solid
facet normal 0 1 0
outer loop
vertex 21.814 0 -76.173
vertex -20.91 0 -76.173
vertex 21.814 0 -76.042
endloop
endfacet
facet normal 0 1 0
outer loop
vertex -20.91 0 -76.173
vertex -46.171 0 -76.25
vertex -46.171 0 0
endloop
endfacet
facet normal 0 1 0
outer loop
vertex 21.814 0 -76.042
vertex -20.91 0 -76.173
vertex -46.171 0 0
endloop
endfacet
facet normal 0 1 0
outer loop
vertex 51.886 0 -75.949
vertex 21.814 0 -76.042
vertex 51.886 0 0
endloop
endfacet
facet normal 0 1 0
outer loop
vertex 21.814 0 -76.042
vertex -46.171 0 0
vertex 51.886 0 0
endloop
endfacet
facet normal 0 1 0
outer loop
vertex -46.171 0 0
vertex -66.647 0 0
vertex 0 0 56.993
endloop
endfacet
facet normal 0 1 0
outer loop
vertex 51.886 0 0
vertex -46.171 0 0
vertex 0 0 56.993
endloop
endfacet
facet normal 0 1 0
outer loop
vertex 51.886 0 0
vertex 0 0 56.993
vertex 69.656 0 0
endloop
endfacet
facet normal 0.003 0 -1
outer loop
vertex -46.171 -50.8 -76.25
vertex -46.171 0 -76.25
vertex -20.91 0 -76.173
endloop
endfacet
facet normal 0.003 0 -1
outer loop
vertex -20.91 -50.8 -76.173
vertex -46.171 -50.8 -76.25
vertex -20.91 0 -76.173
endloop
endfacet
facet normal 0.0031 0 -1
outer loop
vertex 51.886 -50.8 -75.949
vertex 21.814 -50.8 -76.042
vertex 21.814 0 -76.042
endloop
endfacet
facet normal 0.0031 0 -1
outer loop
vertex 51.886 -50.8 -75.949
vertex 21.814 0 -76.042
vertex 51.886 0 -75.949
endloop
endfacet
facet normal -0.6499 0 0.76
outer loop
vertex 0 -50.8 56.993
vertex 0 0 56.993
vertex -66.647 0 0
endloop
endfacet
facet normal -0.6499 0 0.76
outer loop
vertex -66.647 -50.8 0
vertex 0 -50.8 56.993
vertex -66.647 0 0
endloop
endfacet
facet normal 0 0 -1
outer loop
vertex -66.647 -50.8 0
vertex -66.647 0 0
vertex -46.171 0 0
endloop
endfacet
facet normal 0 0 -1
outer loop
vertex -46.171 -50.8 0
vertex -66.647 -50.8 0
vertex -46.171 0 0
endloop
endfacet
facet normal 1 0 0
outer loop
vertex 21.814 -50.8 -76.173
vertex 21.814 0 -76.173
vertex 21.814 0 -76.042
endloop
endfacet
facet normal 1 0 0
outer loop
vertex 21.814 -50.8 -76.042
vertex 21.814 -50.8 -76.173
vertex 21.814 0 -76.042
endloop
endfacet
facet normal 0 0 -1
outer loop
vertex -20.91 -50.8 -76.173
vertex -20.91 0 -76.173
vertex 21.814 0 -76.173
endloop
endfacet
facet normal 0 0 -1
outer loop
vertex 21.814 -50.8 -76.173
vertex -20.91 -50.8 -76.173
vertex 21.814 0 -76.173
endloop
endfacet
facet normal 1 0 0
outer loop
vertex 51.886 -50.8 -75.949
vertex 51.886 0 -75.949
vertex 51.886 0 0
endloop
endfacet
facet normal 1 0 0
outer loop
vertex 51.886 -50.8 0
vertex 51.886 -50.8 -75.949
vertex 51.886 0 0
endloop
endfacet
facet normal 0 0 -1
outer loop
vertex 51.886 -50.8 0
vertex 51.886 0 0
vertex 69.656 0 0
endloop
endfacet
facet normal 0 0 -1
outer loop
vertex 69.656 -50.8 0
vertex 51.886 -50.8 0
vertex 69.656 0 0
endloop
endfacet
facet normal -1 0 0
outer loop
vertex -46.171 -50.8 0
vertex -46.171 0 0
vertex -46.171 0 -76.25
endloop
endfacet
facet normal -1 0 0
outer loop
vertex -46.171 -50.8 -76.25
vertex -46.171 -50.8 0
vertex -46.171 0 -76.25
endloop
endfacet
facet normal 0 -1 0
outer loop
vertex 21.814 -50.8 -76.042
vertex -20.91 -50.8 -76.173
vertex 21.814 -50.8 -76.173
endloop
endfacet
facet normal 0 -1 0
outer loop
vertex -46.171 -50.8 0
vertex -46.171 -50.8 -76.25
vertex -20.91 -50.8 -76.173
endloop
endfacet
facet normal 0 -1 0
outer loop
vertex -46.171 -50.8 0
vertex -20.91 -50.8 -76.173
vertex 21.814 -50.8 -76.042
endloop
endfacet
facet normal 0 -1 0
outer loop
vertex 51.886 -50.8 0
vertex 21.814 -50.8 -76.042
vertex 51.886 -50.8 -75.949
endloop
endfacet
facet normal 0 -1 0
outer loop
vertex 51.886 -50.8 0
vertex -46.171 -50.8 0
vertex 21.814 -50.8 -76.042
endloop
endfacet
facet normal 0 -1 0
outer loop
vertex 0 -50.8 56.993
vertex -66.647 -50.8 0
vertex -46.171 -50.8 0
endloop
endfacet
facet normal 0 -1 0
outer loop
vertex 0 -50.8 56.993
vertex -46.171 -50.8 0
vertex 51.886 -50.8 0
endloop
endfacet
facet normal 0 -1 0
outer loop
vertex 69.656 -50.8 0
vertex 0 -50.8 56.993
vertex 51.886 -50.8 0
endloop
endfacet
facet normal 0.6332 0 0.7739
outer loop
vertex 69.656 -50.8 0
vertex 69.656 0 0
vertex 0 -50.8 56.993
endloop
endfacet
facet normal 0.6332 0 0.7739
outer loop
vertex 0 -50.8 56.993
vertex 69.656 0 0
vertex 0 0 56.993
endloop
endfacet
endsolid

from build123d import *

# Parameters (mm, degrees)
F1_DEPTH = 50.8


with BuildPart() as f1:
    # F0 (on Front) → F1 (new body)
    with BuildSketch(Plane.XZ):
        Polygon((-66.646784544, 0), (-46.1711846292, 0), (51.8861822784, 0), (69.6556717157, 0), (0, 56.993290782), align=None)
        Polygon((51.8861822784, 0), (-46.1711846292, 0), (-46.1711846292, -76.2501358986), (-20.9102912922, -76.1726471121), (-20.9102912922, -21.5385891497), (21.8144096434, -21.5385891497), (21.8144096434, -76.0415874072), (51.8861822784, -75.9493410587), align=None)
        Polygon((-20.9102912922, -21.5385891497), (-20.9102912922, -76.1726471121), (21.8144096434, -76.0415874072), (21.8144096434, -21.5385891497), align=None)
        Polygon((21.8144096434, -76.0415874072), (-20.9102912922, -76.1726471121), (21.8144096434, -76.1726471121), align=None)
    extrude(amount=F1_DEPTH)


solid = f1.part
